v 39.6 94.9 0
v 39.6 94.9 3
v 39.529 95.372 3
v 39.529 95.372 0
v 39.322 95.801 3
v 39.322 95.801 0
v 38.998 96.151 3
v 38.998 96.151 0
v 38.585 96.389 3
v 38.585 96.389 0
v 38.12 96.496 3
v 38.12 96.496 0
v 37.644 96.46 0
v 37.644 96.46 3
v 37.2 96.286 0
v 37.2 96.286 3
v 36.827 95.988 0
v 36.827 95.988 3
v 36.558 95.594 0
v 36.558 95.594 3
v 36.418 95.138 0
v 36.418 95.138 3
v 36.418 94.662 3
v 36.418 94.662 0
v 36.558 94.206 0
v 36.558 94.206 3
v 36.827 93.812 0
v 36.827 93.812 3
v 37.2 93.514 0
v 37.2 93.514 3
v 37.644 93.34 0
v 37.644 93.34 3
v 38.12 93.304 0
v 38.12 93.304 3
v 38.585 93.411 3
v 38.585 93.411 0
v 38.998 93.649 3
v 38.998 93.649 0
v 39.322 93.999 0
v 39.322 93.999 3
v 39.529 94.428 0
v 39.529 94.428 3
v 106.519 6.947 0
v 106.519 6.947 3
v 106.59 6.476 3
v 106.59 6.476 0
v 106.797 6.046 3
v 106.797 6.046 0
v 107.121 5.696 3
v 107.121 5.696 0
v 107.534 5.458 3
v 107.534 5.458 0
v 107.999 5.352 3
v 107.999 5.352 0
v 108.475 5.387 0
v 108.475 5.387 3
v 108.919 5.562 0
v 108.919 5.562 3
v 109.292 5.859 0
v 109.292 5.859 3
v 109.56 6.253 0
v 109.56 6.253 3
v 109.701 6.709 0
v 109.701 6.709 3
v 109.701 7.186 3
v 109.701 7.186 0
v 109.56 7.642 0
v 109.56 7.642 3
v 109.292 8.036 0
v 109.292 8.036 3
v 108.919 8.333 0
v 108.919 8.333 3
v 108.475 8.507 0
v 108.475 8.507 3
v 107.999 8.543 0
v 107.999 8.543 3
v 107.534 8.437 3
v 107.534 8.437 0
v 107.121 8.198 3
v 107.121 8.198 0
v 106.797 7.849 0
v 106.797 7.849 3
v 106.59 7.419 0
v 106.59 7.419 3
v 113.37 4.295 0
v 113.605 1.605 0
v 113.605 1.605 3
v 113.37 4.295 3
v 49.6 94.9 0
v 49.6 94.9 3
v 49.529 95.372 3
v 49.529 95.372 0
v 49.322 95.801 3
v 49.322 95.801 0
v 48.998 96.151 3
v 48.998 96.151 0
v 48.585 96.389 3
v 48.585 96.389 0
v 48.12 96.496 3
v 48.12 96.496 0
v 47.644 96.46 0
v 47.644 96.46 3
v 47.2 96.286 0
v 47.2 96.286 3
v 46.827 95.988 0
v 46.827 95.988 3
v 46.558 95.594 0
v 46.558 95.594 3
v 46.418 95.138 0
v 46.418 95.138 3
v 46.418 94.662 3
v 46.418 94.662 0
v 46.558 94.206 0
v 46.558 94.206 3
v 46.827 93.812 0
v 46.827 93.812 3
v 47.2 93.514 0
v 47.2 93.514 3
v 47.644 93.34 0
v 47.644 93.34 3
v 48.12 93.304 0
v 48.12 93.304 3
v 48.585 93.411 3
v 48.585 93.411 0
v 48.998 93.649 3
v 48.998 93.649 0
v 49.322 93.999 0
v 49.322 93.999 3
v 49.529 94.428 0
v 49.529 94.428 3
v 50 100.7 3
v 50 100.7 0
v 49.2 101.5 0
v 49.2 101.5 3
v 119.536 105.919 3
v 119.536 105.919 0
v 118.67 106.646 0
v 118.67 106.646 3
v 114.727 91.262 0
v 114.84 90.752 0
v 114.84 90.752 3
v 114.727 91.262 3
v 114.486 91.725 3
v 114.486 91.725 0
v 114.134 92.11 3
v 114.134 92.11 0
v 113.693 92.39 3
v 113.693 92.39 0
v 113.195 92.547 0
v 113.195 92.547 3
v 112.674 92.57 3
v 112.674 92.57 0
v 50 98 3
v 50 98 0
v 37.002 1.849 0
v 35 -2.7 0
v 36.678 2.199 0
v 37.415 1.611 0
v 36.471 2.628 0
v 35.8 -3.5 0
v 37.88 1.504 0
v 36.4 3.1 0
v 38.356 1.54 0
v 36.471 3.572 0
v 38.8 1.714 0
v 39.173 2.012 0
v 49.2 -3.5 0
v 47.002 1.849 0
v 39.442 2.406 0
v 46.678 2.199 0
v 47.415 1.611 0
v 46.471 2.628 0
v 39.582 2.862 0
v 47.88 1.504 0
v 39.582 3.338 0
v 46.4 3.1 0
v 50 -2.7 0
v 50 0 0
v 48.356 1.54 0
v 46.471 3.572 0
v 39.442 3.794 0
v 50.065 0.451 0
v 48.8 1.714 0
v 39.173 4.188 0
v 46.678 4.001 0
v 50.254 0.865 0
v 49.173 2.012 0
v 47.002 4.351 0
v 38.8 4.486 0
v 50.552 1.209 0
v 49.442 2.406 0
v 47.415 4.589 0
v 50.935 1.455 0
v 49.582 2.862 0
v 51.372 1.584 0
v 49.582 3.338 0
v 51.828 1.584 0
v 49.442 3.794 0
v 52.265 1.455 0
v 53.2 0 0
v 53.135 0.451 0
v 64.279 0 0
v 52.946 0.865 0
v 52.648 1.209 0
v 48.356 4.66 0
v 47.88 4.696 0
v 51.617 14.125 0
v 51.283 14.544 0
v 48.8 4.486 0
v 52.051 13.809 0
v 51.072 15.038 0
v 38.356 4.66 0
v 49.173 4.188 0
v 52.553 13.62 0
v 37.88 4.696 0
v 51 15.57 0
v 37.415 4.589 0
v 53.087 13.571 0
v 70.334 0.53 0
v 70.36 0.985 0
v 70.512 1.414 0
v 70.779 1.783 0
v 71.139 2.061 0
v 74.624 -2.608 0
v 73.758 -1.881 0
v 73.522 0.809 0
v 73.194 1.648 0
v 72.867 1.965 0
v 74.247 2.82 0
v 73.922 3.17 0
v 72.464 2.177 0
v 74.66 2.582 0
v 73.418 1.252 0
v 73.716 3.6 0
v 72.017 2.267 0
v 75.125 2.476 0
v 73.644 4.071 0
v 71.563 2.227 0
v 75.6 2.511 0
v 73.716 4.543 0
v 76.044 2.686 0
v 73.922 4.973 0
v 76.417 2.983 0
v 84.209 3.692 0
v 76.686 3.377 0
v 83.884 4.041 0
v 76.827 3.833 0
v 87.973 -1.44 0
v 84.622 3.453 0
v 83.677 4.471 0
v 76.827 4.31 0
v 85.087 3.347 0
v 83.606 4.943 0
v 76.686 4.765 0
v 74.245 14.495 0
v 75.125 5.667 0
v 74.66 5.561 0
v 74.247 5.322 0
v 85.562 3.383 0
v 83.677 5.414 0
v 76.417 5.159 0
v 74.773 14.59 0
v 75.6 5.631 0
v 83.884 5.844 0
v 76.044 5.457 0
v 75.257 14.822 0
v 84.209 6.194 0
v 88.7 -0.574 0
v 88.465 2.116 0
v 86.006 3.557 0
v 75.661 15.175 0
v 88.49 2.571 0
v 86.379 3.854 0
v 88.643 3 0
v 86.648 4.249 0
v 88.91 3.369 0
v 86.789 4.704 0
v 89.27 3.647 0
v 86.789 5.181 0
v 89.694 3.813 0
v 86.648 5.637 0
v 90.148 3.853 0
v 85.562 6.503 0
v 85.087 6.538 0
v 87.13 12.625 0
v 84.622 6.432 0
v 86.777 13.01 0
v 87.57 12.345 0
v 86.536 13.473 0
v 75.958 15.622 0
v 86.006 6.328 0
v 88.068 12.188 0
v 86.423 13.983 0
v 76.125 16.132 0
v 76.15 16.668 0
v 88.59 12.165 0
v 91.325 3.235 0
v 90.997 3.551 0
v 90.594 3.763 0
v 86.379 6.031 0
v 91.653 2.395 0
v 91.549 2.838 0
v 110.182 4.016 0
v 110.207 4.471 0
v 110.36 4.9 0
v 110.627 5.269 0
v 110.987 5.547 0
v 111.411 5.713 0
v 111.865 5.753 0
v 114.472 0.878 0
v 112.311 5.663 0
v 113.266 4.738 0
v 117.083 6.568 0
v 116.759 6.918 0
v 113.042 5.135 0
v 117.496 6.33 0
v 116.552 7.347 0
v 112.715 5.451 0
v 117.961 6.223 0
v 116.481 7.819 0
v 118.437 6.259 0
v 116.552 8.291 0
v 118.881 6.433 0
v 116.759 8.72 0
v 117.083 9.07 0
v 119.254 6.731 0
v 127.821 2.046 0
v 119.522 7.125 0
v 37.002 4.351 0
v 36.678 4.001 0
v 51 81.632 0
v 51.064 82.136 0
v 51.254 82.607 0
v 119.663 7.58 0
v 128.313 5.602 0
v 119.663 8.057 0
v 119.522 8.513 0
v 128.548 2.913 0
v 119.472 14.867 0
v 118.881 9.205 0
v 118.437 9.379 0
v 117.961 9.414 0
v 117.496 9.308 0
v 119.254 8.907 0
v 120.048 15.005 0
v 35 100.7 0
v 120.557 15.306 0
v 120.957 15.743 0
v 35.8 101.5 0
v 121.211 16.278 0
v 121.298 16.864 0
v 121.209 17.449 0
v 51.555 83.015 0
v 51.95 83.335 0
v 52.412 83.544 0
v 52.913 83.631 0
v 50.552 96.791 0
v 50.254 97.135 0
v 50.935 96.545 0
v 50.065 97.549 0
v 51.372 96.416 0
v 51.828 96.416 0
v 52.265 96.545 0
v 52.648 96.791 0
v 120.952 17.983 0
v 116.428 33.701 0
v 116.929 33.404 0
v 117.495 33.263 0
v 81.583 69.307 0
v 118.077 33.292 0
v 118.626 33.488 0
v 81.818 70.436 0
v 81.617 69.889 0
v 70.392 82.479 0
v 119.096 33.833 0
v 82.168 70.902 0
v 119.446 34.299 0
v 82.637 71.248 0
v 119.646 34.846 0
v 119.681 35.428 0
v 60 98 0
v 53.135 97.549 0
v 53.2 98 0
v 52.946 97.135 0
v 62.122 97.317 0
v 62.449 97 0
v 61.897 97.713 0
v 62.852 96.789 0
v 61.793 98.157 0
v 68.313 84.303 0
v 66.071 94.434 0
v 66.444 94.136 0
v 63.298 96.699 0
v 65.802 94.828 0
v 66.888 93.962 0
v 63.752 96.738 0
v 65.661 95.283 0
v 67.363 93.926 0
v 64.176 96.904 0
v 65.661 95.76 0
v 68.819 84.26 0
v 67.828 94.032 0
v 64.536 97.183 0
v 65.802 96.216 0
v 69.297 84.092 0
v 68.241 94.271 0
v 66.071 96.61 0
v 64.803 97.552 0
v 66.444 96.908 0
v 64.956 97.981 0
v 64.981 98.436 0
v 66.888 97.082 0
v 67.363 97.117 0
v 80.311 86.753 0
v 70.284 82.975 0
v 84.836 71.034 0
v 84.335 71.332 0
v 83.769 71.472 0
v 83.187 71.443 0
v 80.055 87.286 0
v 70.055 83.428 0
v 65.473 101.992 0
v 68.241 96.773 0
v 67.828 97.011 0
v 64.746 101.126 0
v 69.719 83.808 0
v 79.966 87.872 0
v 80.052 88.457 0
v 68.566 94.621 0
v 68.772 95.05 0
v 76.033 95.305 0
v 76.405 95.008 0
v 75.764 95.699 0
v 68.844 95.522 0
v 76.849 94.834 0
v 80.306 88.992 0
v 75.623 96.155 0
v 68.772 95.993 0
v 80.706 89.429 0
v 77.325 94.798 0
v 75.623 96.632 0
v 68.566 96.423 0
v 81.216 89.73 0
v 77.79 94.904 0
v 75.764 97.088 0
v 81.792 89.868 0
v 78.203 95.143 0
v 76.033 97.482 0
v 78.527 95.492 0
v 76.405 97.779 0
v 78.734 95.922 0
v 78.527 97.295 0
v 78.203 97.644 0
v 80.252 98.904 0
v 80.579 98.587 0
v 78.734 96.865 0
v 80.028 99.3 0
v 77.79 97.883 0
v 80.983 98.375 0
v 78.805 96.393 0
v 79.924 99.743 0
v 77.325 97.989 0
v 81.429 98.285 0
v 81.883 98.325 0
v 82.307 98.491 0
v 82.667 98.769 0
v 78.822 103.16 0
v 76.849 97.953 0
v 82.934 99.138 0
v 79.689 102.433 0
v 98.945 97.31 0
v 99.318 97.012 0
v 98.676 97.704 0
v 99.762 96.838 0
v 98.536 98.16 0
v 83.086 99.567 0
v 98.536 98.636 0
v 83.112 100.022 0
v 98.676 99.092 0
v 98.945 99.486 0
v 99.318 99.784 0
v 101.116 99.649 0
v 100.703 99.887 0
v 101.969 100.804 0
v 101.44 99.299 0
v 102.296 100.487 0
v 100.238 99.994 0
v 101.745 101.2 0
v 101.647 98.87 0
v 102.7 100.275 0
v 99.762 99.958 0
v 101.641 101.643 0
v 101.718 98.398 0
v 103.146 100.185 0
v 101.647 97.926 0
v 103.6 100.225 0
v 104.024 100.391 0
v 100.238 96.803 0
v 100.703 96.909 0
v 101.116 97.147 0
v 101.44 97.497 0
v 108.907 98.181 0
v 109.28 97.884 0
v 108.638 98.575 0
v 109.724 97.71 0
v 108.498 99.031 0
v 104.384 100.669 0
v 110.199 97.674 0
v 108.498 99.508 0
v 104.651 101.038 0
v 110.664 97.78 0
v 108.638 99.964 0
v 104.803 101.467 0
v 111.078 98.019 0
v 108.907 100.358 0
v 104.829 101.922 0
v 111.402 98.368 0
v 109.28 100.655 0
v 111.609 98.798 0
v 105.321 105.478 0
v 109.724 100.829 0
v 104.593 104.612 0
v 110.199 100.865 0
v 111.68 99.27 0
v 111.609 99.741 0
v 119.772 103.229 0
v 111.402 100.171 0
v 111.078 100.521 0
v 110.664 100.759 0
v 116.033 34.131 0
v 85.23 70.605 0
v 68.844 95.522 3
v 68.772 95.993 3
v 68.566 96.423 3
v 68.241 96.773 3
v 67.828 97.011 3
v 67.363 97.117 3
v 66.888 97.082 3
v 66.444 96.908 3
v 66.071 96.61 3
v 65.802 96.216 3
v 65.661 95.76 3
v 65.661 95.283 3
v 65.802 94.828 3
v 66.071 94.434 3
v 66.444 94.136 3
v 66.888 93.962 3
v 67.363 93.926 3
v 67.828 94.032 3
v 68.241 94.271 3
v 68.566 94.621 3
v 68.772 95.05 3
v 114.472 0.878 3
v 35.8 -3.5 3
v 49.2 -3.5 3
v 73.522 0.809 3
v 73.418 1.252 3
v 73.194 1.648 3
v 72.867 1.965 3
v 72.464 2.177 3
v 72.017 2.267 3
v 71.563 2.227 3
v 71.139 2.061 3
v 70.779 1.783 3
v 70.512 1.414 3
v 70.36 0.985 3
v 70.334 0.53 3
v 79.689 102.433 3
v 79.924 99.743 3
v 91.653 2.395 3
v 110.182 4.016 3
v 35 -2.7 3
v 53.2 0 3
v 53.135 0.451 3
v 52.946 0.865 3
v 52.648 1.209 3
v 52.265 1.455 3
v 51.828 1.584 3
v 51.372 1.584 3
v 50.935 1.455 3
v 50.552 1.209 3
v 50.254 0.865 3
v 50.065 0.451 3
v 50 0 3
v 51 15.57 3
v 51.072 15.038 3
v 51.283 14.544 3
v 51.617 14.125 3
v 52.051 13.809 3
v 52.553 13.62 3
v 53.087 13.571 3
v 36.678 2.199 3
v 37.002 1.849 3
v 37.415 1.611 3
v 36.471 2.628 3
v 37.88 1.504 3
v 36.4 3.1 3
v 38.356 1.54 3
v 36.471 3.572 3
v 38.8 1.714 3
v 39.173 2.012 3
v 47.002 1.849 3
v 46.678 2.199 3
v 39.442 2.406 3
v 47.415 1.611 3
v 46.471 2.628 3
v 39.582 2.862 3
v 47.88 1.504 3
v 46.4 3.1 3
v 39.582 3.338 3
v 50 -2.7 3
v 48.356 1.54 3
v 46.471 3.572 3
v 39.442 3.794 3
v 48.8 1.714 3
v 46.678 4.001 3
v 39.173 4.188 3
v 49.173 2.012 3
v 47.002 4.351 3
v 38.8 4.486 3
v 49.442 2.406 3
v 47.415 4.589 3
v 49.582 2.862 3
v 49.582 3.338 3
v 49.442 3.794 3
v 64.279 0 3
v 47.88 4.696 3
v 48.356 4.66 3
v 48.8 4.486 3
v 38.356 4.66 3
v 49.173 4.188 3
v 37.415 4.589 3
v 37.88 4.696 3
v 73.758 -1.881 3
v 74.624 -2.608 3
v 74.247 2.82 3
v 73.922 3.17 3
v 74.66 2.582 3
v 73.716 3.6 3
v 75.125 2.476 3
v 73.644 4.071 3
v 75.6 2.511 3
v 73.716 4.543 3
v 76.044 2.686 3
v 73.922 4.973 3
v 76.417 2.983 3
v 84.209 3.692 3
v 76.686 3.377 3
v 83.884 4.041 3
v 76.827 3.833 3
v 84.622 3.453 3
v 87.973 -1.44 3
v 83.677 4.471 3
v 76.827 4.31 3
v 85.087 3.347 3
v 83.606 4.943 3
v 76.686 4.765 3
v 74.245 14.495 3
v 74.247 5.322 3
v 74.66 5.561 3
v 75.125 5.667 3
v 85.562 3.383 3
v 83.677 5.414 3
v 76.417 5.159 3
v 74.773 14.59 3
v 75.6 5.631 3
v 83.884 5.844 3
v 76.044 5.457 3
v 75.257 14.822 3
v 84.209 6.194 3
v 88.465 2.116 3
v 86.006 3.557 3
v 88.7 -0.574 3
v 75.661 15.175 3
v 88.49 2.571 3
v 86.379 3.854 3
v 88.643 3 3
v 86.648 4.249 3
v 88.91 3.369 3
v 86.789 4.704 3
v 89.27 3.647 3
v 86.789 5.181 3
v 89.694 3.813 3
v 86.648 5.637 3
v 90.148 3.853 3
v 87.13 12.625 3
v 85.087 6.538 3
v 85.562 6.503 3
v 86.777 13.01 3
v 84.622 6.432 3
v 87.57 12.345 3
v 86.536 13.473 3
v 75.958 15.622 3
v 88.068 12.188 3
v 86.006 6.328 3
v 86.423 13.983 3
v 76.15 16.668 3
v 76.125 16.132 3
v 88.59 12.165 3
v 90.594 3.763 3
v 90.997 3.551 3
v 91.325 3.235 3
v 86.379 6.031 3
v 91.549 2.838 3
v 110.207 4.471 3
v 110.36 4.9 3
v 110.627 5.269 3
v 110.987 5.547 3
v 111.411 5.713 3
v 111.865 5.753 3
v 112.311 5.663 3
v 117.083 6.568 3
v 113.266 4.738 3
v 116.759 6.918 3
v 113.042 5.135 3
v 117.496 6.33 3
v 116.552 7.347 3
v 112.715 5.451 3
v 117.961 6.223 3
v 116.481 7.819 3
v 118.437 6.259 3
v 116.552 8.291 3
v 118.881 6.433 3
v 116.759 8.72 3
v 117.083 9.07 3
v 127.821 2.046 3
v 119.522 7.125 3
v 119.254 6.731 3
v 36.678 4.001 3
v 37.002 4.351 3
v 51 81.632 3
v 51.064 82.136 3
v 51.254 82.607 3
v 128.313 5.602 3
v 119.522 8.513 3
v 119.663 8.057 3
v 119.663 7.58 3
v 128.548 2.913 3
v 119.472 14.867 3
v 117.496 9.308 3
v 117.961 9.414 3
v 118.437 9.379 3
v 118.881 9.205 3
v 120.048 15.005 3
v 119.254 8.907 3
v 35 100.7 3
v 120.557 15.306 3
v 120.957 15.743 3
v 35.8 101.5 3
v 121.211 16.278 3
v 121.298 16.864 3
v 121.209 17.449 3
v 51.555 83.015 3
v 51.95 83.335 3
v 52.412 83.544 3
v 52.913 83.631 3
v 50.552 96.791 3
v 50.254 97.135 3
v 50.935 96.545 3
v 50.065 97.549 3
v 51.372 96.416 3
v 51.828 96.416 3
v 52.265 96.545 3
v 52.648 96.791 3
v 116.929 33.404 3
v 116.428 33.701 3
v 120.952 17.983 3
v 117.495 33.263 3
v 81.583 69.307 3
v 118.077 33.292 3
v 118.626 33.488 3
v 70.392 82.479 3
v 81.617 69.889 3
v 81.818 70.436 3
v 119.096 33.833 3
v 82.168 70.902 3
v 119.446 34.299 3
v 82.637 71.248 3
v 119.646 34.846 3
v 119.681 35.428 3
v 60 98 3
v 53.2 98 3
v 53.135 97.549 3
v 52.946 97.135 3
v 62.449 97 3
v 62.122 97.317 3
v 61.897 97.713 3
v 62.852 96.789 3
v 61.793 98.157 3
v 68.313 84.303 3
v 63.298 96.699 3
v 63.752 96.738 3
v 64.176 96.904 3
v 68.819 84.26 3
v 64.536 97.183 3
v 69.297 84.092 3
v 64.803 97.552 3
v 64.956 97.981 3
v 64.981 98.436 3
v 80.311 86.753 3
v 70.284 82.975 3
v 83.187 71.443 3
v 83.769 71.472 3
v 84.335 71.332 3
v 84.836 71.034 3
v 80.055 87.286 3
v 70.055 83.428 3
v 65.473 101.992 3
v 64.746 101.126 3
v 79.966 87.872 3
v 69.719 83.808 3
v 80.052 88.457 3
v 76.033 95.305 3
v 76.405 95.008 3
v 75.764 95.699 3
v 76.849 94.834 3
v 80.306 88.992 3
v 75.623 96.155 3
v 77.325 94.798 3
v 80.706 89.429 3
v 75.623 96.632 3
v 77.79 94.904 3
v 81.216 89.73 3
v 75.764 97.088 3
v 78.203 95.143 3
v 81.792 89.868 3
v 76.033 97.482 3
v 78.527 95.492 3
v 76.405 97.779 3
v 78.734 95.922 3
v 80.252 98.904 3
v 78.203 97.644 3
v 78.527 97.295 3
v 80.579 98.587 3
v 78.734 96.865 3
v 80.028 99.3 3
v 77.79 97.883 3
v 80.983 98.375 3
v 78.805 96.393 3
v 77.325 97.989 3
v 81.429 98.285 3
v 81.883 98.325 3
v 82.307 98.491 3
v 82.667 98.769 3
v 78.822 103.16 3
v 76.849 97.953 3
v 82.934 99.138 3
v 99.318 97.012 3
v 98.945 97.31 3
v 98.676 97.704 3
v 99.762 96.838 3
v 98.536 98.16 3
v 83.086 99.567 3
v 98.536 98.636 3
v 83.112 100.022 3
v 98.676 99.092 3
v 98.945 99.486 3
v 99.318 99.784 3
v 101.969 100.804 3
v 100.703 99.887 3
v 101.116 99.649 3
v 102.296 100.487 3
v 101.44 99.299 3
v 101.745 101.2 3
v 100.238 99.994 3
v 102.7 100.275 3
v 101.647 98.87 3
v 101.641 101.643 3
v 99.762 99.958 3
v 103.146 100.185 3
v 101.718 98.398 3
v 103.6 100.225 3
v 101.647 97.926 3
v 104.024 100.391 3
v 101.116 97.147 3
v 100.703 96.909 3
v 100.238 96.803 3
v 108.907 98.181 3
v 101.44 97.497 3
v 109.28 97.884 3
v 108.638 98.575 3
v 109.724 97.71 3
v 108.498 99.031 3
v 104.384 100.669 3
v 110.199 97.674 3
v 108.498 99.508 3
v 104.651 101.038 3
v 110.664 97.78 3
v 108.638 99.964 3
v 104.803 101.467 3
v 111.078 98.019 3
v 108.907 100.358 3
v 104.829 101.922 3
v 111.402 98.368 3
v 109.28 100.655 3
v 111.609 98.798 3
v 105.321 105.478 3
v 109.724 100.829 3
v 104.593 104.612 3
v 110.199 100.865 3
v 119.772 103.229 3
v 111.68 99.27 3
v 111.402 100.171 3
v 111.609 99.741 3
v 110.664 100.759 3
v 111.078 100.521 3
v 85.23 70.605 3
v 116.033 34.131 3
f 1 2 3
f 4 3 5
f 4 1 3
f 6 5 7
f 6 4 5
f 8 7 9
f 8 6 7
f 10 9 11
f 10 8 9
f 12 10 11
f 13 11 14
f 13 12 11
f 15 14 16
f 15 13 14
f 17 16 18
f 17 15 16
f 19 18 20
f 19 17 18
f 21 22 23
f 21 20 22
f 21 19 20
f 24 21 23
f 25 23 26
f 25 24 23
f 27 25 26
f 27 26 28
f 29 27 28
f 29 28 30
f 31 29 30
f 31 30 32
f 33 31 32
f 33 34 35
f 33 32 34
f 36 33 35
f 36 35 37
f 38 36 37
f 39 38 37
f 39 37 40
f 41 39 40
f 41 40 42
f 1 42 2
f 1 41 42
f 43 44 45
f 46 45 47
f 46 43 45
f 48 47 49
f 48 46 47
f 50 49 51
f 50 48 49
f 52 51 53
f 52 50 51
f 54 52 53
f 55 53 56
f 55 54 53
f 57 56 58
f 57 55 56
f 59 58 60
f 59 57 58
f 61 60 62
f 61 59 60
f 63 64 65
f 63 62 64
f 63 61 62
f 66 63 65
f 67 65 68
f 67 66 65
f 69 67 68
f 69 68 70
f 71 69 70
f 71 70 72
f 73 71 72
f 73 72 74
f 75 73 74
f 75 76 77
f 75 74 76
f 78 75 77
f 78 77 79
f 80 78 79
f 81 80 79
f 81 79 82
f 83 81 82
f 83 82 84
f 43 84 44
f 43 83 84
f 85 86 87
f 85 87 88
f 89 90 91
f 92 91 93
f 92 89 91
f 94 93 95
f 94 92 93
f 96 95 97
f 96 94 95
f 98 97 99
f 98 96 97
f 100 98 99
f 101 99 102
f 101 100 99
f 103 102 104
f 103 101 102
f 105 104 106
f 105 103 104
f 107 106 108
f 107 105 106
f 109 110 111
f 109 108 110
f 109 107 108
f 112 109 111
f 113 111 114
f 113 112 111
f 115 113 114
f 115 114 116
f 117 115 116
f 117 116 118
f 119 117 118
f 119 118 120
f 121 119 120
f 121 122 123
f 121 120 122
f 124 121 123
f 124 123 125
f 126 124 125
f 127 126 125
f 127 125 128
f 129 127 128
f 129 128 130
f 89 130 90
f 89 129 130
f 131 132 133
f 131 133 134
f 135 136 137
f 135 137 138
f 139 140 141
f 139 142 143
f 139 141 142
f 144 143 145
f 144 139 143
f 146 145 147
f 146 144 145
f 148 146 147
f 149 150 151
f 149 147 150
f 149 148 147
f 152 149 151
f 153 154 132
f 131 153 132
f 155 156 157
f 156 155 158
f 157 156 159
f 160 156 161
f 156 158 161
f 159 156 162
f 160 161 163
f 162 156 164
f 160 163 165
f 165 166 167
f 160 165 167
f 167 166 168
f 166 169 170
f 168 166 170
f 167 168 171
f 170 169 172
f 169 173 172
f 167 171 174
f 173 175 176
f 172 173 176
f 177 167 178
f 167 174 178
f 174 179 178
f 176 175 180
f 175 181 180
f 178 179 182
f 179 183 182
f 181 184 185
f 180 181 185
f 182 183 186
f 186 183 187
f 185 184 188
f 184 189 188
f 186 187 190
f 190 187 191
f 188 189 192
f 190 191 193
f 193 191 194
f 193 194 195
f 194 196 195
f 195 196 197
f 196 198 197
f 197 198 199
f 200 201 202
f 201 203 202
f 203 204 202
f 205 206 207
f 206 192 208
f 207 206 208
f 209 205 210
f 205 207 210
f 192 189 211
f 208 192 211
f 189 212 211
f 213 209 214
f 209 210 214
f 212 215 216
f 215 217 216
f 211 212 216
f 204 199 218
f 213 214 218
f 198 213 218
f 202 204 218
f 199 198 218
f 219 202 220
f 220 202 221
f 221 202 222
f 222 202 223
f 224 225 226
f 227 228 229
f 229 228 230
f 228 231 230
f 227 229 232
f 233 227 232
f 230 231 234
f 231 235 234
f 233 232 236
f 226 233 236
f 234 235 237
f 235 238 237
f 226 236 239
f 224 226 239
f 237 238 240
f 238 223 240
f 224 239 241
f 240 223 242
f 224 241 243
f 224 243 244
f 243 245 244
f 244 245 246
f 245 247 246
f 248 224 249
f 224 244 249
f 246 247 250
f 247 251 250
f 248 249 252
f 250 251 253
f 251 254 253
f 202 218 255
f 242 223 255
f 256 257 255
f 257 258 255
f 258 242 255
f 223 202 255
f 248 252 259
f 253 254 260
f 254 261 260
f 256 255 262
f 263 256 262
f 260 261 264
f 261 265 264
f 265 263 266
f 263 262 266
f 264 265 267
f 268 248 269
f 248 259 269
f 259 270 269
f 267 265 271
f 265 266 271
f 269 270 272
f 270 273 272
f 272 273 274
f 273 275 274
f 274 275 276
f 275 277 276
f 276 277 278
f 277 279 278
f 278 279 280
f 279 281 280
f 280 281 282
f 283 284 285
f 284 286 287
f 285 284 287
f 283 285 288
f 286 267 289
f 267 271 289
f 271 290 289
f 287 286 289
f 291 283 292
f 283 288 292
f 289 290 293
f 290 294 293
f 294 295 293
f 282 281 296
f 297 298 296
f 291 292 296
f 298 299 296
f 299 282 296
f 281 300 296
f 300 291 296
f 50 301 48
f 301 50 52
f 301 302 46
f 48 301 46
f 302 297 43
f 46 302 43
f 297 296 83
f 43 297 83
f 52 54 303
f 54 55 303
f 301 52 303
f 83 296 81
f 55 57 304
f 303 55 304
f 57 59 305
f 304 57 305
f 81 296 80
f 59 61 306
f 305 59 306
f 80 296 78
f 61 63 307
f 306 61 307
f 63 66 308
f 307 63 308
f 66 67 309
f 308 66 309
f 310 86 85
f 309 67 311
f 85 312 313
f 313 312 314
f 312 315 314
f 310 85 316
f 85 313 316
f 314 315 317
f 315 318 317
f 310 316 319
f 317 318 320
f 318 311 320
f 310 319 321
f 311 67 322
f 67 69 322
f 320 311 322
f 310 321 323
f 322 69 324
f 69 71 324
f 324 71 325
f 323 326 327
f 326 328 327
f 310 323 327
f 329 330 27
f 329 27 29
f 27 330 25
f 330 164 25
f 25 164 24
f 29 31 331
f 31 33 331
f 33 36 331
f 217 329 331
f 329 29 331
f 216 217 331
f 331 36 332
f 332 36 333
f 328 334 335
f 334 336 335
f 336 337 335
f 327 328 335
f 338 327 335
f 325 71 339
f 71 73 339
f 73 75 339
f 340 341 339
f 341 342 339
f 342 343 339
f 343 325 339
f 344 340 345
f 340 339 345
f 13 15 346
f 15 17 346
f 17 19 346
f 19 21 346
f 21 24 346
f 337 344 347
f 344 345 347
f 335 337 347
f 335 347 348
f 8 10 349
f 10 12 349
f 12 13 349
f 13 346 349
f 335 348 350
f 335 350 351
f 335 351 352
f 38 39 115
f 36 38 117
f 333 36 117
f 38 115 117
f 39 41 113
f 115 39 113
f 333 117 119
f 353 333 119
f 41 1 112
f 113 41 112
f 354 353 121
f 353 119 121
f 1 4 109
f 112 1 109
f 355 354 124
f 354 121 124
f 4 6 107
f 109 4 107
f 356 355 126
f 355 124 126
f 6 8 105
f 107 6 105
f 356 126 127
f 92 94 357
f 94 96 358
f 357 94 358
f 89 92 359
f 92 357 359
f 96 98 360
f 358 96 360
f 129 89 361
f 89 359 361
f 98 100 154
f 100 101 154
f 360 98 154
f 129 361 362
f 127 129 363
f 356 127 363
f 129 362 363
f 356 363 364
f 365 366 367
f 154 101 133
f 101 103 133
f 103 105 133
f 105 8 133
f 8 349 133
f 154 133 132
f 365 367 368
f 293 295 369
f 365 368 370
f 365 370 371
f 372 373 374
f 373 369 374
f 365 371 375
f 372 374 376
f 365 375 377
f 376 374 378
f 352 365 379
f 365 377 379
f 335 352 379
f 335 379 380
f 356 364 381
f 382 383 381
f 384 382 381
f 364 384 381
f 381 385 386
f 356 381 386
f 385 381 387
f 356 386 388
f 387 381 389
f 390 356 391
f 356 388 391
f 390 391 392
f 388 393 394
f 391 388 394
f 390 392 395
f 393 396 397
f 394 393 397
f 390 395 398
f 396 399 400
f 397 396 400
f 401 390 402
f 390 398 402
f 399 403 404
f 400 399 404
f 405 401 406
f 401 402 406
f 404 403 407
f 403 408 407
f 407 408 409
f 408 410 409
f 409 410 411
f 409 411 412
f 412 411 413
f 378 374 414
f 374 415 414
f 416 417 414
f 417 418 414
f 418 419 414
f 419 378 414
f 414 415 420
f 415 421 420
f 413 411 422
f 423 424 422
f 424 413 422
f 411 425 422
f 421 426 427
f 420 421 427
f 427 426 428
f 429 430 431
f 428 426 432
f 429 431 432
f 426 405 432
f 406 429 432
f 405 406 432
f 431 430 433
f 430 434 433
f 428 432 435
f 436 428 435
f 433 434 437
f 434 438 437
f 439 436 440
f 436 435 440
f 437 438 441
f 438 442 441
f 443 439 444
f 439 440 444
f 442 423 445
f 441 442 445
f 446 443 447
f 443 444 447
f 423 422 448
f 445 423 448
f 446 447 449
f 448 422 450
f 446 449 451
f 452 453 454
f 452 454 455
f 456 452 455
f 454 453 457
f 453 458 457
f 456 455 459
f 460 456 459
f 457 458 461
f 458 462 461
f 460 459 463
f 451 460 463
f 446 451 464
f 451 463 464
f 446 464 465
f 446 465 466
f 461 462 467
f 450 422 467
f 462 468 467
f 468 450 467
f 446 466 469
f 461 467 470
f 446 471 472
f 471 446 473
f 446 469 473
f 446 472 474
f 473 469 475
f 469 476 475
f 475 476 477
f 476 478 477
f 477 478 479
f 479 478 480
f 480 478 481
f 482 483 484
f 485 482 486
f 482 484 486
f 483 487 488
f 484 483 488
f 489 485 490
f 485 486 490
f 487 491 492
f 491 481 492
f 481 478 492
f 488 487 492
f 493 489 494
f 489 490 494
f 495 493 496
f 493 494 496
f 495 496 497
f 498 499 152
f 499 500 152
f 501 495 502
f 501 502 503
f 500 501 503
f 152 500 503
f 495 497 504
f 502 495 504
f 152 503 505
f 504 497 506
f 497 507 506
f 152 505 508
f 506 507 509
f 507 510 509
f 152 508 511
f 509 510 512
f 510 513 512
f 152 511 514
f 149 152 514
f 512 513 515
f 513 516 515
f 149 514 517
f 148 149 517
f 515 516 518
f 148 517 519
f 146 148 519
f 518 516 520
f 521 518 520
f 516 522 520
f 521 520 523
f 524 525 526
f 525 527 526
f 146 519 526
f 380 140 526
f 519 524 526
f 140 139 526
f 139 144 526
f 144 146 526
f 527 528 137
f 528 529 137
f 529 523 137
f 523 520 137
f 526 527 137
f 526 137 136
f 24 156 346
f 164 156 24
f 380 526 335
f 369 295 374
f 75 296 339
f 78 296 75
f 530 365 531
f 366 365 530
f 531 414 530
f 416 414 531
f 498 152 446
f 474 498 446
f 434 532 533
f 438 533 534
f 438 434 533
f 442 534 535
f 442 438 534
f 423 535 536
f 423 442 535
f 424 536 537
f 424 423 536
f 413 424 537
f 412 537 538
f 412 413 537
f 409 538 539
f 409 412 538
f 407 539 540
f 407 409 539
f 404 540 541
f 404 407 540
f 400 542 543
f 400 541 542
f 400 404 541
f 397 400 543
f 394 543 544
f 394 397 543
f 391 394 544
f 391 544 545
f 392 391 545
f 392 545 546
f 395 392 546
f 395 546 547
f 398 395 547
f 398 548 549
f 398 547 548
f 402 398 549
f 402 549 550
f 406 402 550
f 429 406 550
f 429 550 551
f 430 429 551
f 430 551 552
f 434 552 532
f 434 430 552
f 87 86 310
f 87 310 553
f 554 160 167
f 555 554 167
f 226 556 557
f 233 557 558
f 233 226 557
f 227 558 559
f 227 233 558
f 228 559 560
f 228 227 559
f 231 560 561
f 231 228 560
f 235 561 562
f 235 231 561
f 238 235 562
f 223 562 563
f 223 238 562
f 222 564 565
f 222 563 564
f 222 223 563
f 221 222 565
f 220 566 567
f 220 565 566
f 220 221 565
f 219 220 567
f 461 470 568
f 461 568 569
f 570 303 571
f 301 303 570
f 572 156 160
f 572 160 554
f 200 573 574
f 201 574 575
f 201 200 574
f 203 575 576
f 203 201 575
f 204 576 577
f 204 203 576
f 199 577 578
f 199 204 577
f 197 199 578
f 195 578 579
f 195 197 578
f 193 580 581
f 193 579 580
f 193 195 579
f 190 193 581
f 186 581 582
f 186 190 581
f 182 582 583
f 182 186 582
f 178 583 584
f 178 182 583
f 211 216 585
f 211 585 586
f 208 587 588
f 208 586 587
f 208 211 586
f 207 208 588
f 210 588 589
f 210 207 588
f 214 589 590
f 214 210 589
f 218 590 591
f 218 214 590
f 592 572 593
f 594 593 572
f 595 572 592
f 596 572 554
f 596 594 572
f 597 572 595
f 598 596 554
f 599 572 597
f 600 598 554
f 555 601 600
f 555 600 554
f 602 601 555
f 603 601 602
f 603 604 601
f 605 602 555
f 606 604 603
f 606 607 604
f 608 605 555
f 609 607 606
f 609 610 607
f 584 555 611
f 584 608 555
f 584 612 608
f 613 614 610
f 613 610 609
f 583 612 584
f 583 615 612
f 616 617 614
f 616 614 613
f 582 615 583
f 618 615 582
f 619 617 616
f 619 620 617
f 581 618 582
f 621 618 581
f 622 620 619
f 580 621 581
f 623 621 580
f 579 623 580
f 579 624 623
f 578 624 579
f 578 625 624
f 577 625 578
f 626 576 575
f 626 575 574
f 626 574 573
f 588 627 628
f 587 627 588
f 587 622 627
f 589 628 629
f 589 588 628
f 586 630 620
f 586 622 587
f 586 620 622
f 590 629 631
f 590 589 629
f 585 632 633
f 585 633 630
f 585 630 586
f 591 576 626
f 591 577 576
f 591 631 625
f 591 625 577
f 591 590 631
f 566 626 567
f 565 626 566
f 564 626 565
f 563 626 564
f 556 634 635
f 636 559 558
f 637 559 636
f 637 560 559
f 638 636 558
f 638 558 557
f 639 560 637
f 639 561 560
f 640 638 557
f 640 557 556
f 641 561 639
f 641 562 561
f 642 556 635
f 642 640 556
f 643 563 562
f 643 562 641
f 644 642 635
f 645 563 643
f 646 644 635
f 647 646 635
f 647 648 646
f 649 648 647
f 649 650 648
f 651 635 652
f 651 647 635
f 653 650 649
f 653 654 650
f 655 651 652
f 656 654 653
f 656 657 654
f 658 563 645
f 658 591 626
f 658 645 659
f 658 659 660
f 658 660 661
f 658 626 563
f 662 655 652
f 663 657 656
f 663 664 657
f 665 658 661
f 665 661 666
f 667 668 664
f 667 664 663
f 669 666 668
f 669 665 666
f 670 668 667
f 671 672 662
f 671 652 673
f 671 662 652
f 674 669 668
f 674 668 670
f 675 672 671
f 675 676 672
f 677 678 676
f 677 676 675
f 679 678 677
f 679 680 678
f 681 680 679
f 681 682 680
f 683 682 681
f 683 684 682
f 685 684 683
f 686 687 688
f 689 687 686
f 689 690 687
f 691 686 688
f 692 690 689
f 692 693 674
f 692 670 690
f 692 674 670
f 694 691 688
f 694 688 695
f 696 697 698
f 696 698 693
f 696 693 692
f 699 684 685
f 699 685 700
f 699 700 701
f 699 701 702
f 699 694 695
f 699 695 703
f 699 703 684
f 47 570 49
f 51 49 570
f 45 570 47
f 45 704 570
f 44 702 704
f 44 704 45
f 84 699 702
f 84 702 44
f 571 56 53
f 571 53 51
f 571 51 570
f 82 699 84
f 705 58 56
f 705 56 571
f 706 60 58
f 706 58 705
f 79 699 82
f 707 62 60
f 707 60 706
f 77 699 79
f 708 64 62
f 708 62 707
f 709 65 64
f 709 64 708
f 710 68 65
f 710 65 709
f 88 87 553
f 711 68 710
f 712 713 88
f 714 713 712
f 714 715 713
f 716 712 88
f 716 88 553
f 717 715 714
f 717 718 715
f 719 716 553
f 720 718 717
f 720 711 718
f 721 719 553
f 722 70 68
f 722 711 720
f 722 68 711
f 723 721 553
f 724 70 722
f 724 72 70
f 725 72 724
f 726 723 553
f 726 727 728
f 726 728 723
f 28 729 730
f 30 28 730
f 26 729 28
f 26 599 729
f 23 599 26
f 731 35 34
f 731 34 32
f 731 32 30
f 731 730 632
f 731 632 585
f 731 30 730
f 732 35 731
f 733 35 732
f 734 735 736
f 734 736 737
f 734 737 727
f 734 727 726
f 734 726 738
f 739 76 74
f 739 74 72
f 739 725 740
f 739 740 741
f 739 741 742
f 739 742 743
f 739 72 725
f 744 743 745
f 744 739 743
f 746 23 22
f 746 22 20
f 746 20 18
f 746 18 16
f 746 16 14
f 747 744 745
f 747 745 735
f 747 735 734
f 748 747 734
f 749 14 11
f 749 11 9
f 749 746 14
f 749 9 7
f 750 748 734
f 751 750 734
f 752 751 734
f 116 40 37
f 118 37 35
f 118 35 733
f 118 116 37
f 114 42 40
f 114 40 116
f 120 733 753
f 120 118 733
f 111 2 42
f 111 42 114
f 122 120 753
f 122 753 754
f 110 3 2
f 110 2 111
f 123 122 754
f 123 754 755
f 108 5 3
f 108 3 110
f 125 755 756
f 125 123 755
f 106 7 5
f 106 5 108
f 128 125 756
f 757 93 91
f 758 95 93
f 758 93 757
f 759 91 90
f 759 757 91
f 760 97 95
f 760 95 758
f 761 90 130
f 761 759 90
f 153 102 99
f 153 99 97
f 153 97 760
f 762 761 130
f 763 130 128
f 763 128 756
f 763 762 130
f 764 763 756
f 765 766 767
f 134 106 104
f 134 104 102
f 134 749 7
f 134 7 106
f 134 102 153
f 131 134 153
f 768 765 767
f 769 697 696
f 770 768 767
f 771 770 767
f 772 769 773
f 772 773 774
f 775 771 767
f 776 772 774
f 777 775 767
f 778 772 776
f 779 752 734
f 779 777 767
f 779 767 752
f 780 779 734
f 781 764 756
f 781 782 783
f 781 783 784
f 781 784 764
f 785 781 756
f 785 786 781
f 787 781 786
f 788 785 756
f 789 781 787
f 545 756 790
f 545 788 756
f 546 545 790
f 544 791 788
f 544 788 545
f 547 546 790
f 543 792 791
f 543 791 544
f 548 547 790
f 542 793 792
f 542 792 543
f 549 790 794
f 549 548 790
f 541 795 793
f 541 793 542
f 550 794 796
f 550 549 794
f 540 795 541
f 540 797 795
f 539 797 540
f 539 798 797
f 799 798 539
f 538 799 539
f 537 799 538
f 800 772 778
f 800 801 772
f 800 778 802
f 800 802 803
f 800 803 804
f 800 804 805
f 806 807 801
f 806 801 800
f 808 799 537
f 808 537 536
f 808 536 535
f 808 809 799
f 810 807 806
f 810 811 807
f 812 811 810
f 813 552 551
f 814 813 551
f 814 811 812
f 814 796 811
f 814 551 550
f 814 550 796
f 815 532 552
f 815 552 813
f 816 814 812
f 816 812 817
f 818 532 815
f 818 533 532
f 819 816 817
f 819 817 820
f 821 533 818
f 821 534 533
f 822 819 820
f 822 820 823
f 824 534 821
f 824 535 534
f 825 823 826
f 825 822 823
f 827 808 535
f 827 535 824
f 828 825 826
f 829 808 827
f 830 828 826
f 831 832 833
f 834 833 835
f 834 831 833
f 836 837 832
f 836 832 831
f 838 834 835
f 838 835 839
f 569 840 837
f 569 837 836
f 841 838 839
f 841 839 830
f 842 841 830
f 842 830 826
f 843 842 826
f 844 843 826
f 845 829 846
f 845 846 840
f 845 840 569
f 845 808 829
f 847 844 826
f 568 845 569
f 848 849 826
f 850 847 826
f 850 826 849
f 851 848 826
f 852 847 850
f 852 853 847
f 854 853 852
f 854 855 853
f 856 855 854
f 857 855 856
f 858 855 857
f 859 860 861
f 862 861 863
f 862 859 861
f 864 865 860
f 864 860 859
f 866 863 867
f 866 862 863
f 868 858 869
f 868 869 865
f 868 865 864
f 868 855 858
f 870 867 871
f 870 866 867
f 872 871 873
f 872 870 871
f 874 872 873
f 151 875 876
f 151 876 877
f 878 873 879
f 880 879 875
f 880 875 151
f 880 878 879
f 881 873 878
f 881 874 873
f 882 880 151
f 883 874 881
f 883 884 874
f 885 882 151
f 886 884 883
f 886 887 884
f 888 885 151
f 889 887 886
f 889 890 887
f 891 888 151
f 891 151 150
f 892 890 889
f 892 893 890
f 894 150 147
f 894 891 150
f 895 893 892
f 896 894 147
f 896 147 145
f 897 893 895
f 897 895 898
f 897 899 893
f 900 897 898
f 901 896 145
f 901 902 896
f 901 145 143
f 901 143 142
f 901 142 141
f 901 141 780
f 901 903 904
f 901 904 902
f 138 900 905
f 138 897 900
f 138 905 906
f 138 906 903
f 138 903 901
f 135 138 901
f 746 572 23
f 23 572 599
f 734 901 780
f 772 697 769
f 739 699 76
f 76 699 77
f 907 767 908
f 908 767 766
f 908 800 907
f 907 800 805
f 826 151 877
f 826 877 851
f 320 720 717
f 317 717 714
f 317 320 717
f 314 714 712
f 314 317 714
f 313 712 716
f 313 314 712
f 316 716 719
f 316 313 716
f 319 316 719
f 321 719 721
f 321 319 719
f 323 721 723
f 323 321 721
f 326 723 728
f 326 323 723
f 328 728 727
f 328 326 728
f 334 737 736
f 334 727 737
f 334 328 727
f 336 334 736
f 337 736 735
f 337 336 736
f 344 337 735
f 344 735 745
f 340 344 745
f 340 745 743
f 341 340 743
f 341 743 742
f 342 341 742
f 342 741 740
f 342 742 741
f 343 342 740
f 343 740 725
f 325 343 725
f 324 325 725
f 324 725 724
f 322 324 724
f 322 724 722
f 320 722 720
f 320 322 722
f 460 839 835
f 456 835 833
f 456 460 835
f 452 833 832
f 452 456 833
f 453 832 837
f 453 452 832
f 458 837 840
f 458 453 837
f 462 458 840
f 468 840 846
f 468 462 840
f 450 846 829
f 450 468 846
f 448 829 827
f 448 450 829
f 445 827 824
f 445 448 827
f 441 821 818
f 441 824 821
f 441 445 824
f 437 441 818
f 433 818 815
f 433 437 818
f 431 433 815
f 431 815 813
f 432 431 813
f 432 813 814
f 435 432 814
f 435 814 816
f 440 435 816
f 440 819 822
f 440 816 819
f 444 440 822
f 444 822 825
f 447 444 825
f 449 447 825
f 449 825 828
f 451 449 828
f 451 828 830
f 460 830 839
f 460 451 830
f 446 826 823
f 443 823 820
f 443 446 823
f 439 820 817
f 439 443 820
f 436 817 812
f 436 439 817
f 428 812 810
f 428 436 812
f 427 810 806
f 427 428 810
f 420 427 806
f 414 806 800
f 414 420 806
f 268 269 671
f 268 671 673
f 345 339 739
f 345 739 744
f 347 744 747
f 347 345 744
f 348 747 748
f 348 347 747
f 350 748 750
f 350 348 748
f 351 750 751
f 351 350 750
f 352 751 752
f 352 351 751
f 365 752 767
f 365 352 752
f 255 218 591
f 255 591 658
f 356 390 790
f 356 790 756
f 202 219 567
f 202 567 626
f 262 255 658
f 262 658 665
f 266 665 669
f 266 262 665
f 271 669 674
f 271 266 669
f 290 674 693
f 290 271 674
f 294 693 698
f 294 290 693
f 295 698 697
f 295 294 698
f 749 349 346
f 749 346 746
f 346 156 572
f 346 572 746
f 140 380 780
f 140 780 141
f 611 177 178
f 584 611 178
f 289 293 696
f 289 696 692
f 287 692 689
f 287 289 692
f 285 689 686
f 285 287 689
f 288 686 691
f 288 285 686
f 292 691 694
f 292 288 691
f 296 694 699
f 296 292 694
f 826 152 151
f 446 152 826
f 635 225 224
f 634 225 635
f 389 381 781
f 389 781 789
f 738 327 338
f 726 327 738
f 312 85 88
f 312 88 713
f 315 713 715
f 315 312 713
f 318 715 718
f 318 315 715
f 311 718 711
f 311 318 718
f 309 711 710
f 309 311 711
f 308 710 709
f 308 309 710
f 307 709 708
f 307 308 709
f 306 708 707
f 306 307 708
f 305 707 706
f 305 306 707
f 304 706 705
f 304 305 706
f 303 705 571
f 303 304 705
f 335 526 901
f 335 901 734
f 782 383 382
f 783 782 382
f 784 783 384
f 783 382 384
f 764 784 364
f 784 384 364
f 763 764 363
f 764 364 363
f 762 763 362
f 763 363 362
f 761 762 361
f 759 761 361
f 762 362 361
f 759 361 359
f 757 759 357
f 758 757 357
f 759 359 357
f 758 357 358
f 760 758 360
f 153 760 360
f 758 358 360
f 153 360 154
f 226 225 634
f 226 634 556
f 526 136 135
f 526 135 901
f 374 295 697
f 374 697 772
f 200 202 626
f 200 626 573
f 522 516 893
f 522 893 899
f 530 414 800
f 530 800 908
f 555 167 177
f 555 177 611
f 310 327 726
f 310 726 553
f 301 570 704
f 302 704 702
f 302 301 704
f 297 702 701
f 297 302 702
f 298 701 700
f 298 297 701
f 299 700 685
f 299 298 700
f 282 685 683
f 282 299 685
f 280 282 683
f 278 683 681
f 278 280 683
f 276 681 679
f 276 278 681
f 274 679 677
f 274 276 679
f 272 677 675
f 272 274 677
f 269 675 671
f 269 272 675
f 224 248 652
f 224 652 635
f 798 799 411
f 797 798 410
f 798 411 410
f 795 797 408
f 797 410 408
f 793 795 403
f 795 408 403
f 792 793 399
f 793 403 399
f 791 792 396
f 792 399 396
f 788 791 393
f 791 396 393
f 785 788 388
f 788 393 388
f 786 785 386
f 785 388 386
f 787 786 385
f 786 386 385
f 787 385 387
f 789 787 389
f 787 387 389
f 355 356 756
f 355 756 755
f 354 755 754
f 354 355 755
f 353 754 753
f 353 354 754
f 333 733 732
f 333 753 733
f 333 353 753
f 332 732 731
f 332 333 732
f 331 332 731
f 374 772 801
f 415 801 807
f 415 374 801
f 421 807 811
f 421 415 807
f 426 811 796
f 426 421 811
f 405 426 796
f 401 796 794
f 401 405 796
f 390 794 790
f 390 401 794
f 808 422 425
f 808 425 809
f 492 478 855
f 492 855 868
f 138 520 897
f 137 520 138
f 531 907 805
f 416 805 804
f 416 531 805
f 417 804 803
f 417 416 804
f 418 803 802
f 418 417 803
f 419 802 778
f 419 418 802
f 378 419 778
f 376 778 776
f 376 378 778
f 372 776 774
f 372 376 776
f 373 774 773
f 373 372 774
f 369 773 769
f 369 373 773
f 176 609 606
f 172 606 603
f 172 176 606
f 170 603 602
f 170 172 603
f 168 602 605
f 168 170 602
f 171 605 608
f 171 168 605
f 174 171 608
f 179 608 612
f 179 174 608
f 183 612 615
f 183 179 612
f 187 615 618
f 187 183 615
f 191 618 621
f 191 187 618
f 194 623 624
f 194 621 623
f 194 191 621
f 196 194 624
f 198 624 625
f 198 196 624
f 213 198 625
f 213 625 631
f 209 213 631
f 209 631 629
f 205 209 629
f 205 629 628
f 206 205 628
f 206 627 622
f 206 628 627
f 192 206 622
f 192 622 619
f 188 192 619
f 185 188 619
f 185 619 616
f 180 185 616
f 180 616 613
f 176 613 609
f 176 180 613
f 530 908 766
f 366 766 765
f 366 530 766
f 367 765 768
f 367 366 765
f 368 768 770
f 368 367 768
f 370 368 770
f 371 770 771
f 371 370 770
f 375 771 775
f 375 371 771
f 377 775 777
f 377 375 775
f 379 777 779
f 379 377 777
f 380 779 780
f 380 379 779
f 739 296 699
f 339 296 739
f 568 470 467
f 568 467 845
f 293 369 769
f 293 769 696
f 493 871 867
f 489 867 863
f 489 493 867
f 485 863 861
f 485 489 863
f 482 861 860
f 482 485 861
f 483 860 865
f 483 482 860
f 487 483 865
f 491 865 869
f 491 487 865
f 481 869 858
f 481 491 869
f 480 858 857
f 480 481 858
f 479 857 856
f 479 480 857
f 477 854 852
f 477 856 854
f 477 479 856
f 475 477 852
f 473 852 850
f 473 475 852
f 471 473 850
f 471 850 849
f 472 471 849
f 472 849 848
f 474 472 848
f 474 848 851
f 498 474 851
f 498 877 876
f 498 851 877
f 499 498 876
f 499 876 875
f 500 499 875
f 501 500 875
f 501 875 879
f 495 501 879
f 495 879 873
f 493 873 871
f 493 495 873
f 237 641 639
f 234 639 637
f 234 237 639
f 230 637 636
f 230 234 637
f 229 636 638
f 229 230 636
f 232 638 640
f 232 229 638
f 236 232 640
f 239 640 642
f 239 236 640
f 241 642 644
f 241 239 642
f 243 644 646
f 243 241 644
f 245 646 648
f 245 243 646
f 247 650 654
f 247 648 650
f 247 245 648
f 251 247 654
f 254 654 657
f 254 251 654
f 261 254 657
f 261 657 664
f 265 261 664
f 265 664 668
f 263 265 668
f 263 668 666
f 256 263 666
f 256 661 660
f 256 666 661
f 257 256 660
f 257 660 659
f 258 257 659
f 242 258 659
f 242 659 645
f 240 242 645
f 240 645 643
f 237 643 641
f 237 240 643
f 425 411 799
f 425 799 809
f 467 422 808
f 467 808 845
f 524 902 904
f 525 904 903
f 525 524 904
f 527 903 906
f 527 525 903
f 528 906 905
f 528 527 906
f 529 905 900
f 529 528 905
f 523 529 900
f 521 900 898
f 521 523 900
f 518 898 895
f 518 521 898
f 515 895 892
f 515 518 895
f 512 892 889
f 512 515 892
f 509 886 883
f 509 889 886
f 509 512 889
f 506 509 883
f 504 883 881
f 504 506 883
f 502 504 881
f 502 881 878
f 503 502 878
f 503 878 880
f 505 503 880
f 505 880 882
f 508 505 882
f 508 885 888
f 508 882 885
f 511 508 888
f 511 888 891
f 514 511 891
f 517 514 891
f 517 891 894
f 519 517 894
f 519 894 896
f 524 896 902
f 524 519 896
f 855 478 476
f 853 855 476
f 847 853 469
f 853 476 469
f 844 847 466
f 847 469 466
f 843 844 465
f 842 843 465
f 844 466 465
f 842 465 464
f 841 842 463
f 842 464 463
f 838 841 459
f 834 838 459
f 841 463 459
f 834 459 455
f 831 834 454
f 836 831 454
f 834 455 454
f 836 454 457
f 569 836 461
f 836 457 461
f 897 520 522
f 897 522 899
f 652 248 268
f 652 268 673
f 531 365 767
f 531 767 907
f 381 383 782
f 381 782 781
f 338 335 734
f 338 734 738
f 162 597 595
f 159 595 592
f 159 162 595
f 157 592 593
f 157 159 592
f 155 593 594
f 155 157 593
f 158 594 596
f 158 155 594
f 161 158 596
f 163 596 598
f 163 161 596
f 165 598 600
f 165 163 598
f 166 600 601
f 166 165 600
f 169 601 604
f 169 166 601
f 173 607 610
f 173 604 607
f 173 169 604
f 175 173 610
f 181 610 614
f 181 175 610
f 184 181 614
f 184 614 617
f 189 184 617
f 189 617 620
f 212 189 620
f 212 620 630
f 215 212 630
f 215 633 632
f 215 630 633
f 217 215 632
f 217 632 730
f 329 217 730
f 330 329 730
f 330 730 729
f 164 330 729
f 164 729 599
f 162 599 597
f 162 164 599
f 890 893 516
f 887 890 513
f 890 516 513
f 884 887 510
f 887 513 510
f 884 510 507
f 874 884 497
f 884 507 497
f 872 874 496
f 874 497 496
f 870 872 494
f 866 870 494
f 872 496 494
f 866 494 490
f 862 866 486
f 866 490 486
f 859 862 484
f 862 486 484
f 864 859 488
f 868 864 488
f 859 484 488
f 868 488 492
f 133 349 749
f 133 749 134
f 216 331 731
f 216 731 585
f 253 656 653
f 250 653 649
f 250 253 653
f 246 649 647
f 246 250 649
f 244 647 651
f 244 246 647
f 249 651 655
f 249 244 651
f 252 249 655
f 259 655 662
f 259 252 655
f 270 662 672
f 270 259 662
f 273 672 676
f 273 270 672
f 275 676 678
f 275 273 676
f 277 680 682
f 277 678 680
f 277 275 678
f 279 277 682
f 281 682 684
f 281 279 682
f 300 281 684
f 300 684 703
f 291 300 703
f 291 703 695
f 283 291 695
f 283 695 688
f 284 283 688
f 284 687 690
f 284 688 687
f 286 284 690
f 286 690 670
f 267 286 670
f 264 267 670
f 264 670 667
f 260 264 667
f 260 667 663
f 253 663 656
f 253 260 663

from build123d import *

# Parameters (mm, degrees)
EXTRUDE_1_DEPTH     = 3
EXTRUDE_2_DEPTH     = 3
SKETCH_3_R          = 1.6
CUT_EXTRUDE_1_DEPTH = 168.152318263
SKETCH_4_W          = 15
SKETCH_4_H          = 3.5
EXTRUDE_3_DEPTH     = 3
SKETCH_5_R          = 1.6
CUT_EXTRUDE_2_DEPTH = 168.152318263
CHAMFER_1_SIZE      = 0.8
CUT_EXTRUDE_3_DEPTH = 168.054153154
CUT_EXTRUDE_4_DEPTH = 10


with BuildPart() as part:
    # 草图1 → 凸台-拉伸1 (new body)
    with BuildSketch(Plane.XY):
        Polygon((0, 0), (0, 98), (60, 98), (119.771681886, 103.229344565), (128.312944675, 5.602264152), (64.278772405, 0), align=None)
    extrude(amount=EXTRUDE_1_DEPTH)

    # 草图2 → 凸台-拉伸2 (add, through all)
    with BuildSketch(Plane.XY):
        Polygon((119.771681886, 103.229344565), (104.828761414, 101.922008424), (104.523716315, 105.408689867), (119.466636786, 106.716026008), align=None)
        Polygon((79.923893962, 99.743114855), (64.98097349, 98.435778714), (64.675928391, 101.922460157), (79.618848862, 103.229796298), align=None)
        Polygon((128.617989774, 2.115582709), (113.675069303, 0.808246567), (113.370024203, 4.294928011), (128.312944675, 5.602264152), align=None)
        Polygon((88.770201851, -1.370647001), (73.827281379, -2.677983143), (73.52223628, 0.808698301), (88.465156751, 2.116034442), align=None)
    extrude(amount=EXTRUDE_2_DEPTH)

    # 草图3 → 切除-拉伸1 (cut, through all)
    with BuildSketch(Plane.XY):
        with Locations((110.079917707, 99.269583573)):
            Circle(SKETCH_3_R)
        with Locations((100.117970726, 98.398026146)):
            Circle(SKETCH_3_R)
        with Locations((77.20549267, 96.393444063)):
            Circle(SKETCH_3_R)
        with Locations((67.243545689, 95.521886635)):
            Circle(SKETCH_3_R)
        with Locations(Location((118.080814891, 7.818910288, 0), (0, 0, 180))):
            Circle(SKETCH_3_R)
        with Locations(Location((108.11886791, 6.947352861, 0), (0, 0, 180))):
            Circle(SKETCH_3_R)
        with Locations(Location((85.206389854, 4.942770778, 0), (0, 0, 180))):
            Circle(SKETCH_3_R)
        with Locations(Location((75.244442873, 4.07121335, 0), (0, 0, 180))):
            Circle(SKETCH_3_R)
        with BuildLine():
            Line((101.64093838, 101.643110047), (104.828761414, 101.922008424))
            ThreePointArc((104.828761414, 101.922008424), (103.374299086, 100.188647718), (101.64093838, 101.643110047))
        make_face()
        with BuildLine():
            Line((79.923893962, 99.743114855), (83.111716996, 100.022013232))
            ThreePointArc((83.111716996, 100.022013232), (81.657254667, 98.288652526), (79.923893962, 99.743114855))
        make_face()
        with BuildLine():
            Line((61.793150457, 98.156880337), (64.98097349, 98.435778714))
            ThreePointArc((64.98097349, 98.435778714), (63.526511162, 96.702418008), (61.793150457, 98.156880337))
        make_face()
        with BuildLine():
            Line((70.334413246, 0.529799924), (73.52223628, 0.808698301))
            ThreePointArc((73.52223628, 0.808698301), (71.788875574, 2.263160629), (70.334413246, 0.529799924))
        make_face()
        with BuildLine():
            Line((88.465156751, 2.116034442), (91.652979785, 2.394932819))
            ThreePointArc((91.652979785, 2.394932819), (89.91961908, 3.849395147), (88.465156751, 2.116034442))
        make_face()
        with BuildLine():
            Line((110.18220117, 4.016029634), (113.370024203, 4.294928011))
            ThreePointArc((113.370024203, 4.294928011), (111.636663498, 5.749390339), (110.18220117, 4.016029634))
        make_face()
    extrude(amount=CUT_EXTRUDE_1_DEPTH, mode=Mode.SUBTRACT)

    # 草图4 → 凸台-拉伸3 (add, through all)
    with BuildSketch(Plane.XY):
        with Locations((42.5, 99.75)):
            Rectangle(SKETCH_4_W, SKETCH_4_H)
        with Locations((7.5, 99.75)):
            Rectangle(SKETCH_4_W, SKETCH_4_H)
        with Locations((42.5, -1.75)):
            Rectangle(SKETCH_4_W, SKETCH_4_H)
        with Locations((7.5, -1.75)):
            Rectangle(SKETCH_4_W, SKETCH_4_H)
    extrude(amount=EXTRUDE_3_DEPTH)

    # 草图5 → 切除-拉伸2 (cut, through all)
    with BuildSketch(Plane.XY):
        with Locations((3, 94.9)):
            Circle(SKETCH_5_R)
        with Locations((13, 94.9)):
            Circle(SKETCH_5_R)
        with Locations((38, 94.9)):
            Circle(SKETCH_5_R)
        with Locations((48, 94.9)):
            Circle(SKETCH_5_R)
        with Locations(Location((3, 3.1, 0), (0, 0, 180))):
            Circle(SKETCH_5_R)
        with Locations(Location((13, 3.1, 0), (0, 0, 180))):
            Circle(SKETCH_5_R)
        with Locations(Location((48, 3.1, 0), (0, 0, 180))):
            Circle(SKETCH_5_R)
        with Locations(Location((38, 3.1, 0), (0, 0, 180))):
            Circle(SKETCH_5_R)
        with BuildLine():
            Line((15, 98), (18.2, 98))
            ThreePointArc((18.2, 98), (16.6, 96.4), (15, 98))
        make_face()
        with BuildLine():
            Line((31.8, 98), (35, 98))
            ThreePointArc((35, 98), (33.4, 96.4), (31.8, 98))
        make_face()
        with BuildLine():
            Line((50, 98), (53.2, 98))
            ThreePointArc((53.2, 98), (51.6, 96.4), (50, 98))
        make_face()
        with BuildLine():
            Line((50, 0), (53.2, 0))
            ThreePointArc((53.2, 0), (51.6, 1.6), (50, 0))
        make_face()
        with BuildLine():
            Line((31.8, 0), (35, 0))
            ThreePointArc((35, 0), (33.4, 1.6), (31.8, 0))
        make_face()
        with BuildLine():
            Line((15, 0), (18.2, 0))
            ThreePointArc((18.2, 0), (16.6, 1.6), (15, 0))
        make_face()
    extrude(amount=CUT_EXTRUDE_2_DEPTH, mode=Mode.SUBTRACT)

    # 倒角1
    chamfer_1_edges = [part.edges().sort_by_distance(p)[0] for p in [
        (0, 101.5, 1.5),
        (15, 101.5, 1.5),
        (35, -3.5, 1.5),
        (50, -3.5, 1.5),
        (35, 101.5, 1.5),
        (50, 101.5, 1.5),
        (0, -3.5, 1.5),
        (15, -3.5, 1.5),
        (119.466636786, 106.716026008, 1.5),
        (104.523716315, 105.408689867, 1.5),
        (79.618848862, 103.229796298, 1.5),
        (64.675928391, 101.922460157, 1.5),
        (128.617989774, 2.115582709, 1.5),
        (113.675069303, 0.808246567, 1.5),
        (88.770201851, -1.370647001, 1.5),
        (73.827281379, -2.677983143, 1.5),
    ]]
    chamfer(chamfer_1_edges, length=CHAMFER_1_SIZE)

    # 草图6 → 切除-拉伸3 (cut, through all)
    with BuildSketch(Plane.XY):
        with BuildLine():
            Line((88.589794022, 12.165137166), (119.471829663, 14.866965191))
            ThreePointArc((119.471829663, 14.866965191), (121.103967944, 16.001019432), (120.952257678, 17.982669852))
            Line((120.952257678, 17.982669852), (85.230022186, 70.604579281))
            ThreePointArc((85.230022186, 70.604579281), (82.904864414, 71.365551505), (81.582893289, 69.306952531))
            Line((81.582893289, 69.306952531), (86.42309314, 13.983215076))
            ThreePointArc((86.42309314, 13.983215076), (87.129907317, 12.625437676), (88.589794022, 12.165137166))
        make_face()
        with BuildLine():
            Line((119.680582461, 35.428336277), (114.84038261, 90.752073731))
            ThreePointArc((114.84038261, 90.752073731), (114.133568433, 92.109851132), (112.673681728, 92.570151642))
            Line((112.673681728, 92.570151642), (81.791646087, 89.868323617))
            ThreePointArc((81.791646087, 89.868323617), (80.159507806, 88.734269376), (80.311218072, 86.752618956))
            Line((80.311218072, 86.752618956), (116.033453564, 34.130709527))
            ThreePointArc((116.033453564, 34.130709527), (118.358611336, 33.369737303), (119.680582461, 35.428336277))
        make_face()
        with BuildLine():
            Line((51, 81.632404391), (51, 15.56952717))
            ThreePointArc((51, 15.56952717), (51.616973888, 14.124799246), (53.087238775, 13.571430727))
            Line((53.087238775, 13.571430727), (74.244890746, 14.495193762))
            ThreePointArc((74.244890746, 14.495193762), (75.661331586, 15.174598575), (76.150041367, 16.667601691))
            Line((76.150041367, 16.667601691), (70.392282235, 82.479089719))
            ThreePointArc((70.392282235, 82.479089719), (69.718584469, 83.808457848), (68.312654064, 84.302874676))
            Line((68.312654064, 84.302874676), (52.912761225, 83.630500834))
            ThreePointArc((52.912761225, 83.630500834), (51.555272076, 83.015430503), (51, 81.632404391))
        make_face()
    extrude(amount=CUT_EXTRUDE_3_DEPTH, mode=Mode.SUBTRACT)

    # 草图7 → 切除-拉伸4 (cut)
    with BuildSketch(Plane.XY.offset(3)):
        Polygon((35, 98), (35, 0), (27.806316321, -5.327994522), (11.72452964, -8.165956877), (-13.438736579, -4.098210834), (-15.046915247, 45.849926623), (-17.790278858, 82.365042265), (-16.749692661, 87.378775759), (-5.587040729, 104.690346128), (16.549065644, 104.690346128), align=None)
    extrude(amount=-CUT_EXTRUDE_4_DEPTH, mode=Mode.SUBTRACT)


solid = part.part
